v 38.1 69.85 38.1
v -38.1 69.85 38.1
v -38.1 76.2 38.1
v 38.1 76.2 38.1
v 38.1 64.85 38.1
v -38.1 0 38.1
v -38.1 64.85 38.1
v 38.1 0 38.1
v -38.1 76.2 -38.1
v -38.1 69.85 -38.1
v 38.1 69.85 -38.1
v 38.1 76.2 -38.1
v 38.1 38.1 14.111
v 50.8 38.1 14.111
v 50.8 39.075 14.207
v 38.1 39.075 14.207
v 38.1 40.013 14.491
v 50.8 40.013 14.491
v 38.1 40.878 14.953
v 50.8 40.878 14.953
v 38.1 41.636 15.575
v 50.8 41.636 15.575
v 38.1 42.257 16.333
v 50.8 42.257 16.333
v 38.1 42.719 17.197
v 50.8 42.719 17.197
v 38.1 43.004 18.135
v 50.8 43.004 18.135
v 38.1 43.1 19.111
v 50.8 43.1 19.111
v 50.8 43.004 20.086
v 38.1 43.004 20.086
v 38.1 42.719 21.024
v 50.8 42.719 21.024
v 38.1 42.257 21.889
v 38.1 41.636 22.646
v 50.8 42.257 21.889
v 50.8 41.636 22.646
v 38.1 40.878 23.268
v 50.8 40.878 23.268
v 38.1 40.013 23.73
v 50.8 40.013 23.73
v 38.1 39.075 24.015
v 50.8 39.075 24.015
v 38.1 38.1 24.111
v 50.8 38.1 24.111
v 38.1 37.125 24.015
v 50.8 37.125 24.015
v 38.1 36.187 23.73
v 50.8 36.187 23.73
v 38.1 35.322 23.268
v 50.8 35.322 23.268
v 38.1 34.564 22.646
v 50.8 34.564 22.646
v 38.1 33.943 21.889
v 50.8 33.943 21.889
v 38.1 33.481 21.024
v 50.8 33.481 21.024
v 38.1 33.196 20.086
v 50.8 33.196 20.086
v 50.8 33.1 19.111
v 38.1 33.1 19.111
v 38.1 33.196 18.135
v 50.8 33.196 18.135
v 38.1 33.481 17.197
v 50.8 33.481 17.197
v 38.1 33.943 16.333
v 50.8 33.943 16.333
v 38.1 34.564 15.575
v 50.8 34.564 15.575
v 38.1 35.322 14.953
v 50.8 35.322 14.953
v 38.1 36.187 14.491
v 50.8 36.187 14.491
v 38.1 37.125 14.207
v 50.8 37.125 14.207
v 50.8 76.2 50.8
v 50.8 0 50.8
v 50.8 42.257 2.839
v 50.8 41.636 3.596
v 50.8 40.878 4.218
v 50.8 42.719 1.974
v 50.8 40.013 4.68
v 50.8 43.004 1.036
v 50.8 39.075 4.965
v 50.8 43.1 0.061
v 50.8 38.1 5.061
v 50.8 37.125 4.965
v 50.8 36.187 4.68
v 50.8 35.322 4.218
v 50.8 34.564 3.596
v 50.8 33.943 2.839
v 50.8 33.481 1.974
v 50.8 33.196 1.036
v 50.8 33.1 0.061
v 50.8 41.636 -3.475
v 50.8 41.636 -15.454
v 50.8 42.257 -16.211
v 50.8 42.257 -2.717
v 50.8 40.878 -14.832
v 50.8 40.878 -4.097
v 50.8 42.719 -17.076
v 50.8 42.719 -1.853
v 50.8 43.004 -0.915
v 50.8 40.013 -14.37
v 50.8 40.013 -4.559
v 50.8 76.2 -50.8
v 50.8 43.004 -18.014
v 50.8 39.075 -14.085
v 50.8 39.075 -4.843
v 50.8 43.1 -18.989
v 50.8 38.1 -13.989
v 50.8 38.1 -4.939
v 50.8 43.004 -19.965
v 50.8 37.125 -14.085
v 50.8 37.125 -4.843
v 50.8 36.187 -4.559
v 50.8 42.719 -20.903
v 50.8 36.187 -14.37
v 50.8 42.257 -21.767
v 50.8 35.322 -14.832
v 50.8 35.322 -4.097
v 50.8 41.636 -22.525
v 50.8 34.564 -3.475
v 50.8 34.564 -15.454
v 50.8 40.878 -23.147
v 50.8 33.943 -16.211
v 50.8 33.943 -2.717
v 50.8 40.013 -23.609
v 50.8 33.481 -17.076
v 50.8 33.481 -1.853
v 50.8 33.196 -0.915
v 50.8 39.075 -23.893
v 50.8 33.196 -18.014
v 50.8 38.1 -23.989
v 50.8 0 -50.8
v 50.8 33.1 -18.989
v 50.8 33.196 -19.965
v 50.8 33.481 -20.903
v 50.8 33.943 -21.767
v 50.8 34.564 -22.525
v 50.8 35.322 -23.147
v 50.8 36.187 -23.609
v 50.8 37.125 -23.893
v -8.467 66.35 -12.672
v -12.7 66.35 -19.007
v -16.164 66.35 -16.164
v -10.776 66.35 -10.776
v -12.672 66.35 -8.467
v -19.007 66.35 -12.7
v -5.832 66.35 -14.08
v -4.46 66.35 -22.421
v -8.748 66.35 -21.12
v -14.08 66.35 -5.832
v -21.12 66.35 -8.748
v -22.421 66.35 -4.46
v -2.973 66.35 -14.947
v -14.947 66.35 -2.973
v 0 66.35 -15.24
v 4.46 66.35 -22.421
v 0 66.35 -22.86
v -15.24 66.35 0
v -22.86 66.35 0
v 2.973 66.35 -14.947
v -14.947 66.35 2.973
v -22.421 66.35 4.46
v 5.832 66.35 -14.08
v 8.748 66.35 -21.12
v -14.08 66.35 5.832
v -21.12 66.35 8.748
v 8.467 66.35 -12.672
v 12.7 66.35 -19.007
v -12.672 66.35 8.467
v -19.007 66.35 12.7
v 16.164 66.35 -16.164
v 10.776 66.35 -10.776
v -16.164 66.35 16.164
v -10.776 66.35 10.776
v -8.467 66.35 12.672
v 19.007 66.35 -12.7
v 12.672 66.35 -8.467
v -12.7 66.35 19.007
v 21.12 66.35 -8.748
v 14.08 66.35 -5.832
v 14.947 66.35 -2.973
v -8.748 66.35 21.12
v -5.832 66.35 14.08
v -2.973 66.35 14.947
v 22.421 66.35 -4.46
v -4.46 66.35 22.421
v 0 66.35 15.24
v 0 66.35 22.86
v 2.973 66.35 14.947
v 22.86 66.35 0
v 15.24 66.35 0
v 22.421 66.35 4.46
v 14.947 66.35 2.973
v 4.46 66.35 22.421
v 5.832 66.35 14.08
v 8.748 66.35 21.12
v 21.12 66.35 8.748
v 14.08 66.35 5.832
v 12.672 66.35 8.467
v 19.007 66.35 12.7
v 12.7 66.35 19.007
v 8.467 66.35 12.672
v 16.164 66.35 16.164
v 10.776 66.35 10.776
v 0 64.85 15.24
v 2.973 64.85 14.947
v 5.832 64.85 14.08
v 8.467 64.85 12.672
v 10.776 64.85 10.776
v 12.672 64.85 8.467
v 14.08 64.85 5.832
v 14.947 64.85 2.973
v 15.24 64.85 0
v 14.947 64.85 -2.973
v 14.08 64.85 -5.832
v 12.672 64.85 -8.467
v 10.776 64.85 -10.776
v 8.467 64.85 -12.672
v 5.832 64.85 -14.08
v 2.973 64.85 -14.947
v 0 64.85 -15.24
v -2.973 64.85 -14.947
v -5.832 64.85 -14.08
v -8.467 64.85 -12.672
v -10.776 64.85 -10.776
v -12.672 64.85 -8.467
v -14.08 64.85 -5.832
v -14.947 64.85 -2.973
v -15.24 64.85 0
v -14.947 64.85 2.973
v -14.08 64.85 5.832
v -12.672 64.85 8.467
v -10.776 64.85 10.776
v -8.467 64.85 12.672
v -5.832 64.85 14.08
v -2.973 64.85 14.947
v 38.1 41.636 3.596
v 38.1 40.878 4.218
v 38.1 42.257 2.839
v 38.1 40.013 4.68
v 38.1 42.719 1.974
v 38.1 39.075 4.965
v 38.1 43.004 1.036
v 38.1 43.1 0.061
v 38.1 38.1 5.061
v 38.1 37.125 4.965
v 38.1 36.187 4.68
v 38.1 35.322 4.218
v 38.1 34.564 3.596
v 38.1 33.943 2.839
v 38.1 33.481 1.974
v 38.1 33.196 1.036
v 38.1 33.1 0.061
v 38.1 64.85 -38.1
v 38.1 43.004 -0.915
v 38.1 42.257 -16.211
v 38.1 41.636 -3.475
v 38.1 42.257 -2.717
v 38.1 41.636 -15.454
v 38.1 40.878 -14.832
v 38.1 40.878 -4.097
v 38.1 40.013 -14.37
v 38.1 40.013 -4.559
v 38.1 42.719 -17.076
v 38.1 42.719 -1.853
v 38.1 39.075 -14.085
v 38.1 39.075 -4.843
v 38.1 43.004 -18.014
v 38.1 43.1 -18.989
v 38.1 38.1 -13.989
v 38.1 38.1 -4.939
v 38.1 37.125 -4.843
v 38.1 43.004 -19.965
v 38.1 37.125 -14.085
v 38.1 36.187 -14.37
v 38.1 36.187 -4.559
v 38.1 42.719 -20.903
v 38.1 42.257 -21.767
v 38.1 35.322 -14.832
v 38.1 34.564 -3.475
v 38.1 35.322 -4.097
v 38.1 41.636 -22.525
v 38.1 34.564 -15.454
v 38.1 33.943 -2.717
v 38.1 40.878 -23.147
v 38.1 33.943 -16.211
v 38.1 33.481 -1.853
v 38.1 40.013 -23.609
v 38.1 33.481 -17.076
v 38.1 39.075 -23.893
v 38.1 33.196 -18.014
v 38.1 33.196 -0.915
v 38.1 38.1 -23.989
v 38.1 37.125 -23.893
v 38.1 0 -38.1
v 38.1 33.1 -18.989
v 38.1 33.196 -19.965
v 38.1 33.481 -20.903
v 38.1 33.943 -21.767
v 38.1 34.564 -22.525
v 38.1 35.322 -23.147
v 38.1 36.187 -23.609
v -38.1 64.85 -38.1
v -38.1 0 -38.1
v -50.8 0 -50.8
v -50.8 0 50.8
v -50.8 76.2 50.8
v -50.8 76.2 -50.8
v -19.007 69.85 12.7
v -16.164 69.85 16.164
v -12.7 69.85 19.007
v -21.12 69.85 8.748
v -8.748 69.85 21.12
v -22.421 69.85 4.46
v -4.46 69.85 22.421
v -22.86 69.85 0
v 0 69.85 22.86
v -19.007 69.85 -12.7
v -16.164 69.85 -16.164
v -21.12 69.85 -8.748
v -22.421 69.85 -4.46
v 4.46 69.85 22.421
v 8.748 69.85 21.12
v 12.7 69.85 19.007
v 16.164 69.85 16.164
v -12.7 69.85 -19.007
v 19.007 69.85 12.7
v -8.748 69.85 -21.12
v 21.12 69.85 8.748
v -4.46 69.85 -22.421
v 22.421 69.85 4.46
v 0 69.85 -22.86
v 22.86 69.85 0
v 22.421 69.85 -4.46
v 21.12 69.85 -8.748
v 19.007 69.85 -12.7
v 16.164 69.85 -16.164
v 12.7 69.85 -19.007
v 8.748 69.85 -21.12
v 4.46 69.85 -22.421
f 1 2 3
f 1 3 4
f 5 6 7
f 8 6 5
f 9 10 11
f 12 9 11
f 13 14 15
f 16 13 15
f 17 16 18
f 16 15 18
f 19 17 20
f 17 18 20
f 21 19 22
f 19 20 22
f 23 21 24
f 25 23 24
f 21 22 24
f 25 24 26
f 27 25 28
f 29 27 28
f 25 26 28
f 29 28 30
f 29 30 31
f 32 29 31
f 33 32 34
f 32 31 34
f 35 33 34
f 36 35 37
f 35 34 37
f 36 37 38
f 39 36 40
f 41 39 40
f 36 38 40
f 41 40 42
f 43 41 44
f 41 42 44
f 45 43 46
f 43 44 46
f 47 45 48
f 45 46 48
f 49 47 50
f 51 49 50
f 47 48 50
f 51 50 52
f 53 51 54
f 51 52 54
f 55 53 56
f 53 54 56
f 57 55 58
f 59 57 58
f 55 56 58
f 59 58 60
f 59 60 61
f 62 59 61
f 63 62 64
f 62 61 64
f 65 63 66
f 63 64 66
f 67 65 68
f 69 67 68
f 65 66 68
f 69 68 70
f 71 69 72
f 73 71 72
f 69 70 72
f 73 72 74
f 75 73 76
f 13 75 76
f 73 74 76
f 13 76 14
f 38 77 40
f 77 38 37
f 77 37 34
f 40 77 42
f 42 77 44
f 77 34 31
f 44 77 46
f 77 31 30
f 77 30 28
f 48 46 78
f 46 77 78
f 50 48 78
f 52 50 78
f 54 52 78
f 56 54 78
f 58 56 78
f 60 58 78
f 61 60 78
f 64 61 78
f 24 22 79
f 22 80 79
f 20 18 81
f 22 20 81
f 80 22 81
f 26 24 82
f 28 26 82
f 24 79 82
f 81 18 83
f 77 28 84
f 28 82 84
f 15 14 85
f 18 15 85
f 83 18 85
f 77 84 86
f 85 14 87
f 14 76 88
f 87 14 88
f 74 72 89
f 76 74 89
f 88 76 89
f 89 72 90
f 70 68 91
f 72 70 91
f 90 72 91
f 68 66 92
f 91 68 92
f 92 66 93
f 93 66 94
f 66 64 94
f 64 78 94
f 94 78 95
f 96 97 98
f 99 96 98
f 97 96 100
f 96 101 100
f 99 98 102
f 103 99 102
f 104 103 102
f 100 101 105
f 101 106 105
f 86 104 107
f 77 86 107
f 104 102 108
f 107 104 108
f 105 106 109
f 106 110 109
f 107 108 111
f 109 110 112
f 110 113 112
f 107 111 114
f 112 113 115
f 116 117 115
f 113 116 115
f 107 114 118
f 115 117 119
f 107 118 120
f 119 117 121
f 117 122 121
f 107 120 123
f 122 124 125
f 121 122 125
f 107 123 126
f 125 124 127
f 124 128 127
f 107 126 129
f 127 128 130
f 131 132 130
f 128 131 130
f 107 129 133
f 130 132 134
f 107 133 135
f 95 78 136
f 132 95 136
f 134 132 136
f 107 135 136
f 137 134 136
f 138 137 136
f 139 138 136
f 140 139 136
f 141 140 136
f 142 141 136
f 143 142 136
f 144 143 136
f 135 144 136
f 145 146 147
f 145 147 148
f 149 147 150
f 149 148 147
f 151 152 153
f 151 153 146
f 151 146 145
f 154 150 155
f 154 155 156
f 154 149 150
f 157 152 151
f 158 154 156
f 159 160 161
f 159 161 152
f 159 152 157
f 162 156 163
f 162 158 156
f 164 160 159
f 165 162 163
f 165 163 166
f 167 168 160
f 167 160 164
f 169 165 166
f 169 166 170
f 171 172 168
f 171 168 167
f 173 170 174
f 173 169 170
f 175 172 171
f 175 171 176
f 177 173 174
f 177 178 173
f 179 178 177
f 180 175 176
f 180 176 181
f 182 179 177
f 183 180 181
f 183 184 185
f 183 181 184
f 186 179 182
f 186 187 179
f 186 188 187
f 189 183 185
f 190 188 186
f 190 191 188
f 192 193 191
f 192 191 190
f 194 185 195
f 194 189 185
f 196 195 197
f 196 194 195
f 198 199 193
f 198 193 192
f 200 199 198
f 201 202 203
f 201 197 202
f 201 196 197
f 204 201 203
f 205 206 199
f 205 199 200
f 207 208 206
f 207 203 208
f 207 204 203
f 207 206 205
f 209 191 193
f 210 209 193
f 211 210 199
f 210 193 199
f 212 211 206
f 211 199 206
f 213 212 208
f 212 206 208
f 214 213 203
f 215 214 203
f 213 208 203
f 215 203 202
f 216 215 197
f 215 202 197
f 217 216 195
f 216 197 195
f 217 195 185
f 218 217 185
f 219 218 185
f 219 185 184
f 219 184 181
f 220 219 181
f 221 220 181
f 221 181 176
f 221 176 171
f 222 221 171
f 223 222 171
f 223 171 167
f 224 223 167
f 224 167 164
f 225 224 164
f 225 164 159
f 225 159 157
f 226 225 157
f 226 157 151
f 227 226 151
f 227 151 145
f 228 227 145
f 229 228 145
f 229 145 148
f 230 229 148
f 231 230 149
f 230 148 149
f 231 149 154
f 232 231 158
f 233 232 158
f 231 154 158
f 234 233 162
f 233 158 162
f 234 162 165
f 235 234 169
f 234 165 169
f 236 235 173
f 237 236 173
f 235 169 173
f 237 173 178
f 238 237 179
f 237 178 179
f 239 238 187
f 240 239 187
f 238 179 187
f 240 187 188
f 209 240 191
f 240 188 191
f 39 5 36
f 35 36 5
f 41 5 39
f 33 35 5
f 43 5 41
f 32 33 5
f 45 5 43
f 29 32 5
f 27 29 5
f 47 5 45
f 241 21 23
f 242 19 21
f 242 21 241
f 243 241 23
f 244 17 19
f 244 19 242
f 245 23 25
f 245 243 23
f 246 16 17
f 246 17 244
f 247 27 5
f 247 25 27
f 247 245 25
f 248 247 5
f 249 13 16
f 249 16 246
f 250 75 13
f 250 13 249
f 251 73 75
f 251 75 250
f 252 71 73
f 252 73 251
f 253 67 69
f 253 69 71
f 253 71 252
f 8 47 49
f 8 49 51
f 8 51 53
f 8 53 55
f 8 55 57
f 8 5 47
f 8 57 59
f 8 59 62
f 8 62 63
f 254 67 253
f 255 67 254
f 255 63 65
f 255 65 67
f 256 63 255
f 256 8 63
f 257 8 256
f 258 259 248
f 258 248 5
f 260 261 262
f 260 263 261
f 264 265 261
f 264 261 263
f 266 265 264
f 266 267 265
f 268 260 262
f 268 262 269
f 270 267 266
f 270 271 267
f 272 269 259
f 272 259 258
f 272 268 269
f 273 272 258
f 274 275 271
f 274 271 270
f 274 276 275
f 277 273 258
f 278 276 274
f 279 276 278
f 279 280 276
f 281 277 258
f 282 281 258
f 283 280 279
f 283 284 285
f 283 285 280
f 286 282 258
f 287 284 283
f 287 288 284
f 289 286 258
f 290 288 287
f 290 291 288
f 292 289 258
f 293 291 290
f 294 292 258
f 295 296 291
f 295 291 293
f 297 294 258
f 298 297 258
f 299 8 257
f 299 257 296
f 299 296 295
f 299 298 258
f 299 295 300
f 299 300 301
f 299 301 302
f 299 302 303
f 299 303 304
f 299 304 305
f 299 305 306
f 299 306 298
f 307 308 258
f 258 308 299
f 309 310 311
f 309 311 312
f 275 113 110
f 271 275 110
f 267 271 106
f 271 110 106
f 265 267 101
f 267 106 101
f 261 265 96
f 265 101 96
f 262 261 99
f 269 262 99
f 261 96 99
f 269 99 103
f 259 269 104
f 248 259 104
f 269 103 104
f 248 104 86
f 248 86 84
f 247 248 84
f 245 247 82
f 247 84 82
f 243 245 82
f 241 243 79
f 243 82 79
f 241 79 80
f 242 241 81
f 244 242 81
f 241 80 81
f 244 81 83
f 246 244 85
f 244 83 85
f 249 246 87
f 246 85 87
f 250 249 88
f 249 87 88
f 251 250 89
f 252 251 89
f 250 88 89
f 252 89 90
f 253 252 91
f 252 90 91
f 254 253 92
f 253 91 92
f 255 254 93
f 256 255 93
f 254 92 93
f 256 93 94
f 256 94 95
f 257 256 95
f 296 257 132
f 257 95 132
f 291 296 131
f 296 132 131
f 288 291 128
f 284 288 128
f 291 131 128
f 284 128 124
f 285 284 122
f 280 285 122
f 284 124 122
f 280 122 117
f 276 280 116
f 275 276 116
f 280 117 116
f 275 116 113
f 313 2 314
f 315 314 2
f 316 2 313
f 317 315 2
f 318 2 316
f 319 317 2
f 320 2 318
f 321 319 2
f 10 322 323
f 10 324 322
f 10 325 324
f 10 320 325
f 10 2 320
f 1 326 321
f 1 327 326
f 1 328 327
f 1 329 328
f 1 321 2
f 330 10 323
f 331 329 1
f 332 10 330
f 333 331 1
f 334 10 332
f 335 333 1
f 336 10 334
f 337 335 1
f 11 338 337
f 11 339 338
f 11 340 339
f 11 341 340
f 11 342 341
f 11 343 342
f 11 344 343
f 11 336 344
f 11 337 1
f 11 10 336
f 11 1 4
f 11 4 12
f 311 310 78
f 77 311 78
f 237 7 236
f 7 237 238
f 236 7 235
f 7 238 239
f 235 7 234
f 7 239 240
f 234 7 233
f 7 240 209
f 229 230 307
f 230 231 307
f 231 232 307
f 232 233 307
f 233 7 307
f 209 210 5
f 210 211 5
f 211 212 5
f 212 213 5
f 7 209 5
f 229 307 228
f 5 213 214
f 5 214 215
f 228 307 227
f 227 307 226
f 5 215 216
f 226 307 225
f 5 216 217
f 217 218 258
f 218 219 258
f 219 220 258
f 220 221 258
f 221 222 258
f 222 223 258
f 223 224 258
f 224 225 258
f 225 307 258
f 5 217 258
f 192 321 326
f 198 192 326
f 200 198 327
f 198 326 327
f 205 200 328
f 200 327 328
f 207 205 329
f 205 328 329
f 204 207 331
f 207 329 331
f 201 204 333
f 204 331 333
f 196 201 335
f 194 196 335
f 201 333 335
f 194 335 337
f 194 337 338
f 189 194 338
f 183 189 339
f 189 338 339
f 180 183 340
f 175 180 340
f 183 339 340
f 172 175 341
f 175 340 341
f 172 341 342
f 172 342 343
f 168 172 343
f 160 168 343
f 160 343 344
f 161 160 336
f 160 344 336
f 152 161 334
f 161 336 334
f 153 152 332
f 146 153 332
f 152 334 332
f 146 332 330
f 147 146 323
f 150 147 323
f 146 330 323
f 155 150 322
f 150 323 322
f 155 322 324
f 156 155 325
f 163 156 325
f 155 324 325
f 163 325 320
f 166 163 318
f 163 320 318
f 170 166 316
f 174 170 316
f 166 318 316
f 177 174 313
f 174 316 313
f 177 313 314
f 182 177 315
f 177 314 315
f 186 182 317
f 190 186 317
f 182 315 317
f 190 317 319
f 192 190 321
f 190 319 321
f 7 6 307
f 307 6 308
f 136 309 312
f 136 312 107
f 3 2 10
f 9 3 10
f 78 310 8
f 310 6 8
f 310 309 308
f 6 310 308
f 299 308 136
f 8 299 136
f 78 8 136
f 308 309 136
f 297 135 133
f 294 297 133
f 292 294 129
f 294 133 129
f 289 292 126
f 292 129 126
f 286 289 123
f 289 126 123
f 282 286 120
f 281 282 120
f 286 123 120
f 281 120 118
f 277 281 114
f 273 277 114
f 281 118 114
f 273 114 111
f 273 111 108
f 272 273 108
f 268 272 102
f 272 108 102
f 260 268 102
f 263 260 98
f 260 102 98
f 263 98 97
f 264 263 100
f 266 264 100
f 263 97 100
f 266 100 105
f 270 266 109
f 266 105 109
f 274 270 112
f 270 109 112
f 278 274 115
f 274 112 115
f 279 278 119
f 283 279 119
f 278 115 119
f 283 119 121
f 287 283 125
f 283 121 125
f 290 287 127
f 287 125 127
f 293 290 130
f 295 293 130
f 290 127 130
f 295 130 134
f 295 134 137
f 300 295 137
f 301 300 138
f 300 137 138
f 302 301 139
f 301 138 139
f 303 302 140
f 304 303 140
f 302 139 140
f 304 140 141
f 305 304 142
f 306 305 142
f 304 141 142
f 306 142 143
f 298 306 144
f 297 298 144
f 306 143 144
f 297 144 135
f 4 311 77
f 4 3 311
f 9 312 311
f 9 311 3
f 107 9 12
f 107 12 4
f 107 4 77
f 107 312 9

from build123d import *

# Parameters (mm, degrees)
SKETCH1_W           = 101.6
SKETCH1_H           = 101.6
SKETCH1_W_2         = 76.2
SKETCH1_H_2         = 76.2
BOSS_EXTRUDE1_DEPTH = 76.2
BOSS_EXTRUDE2_START = -6.35
SKETCH2_W           = 76.2
SKETCH2_H           = 76.2
SKETCH2_R           = 15.24
BOSS_EXTRUDE2_DEPTH = 5
SKETCH3_R           = 22.86
CUT_EXTRUDE2_DEPTH  = 3.5
SKETCH4_R           = 5
CUT_EXTRUDE3_DEPTH  = 12.7


with BuildPart() as part:
    # Sketch1 → Boss-Extrude1 (new body)
    with BuildSketch(Plane(origin=(0, 0, 0), x_dir=(1, 0, 0), z_dir=(0, 1, 0))):
        Rectangle(SKETCH1_W, SKETCH1_H)
        Rectangle(SKETCH1_W_2, SKETCH1_H_2, mode=Mode.SUBTRACT)
    extrude(amount=BOSS_EXTRUDE1_DEPTH)

    # Sketch2 → Boss-Extrude2 (add)
    with BuildSketch(Plane(origin=(0, 76.2, 0), x_dir=(1, 0, 0), z_dir=(0, 1, 0)).offset(BOSS_EXTRUDE2_START)):
        Rectangle(SKETCH2_W, SKETCH2_H)
        with Locations(Location((0, 0, 0), (0, 0, 270))):
            Circle(SKETCH2_R, mode=Mode.SUBTRACT)
    extrude(amount=-BOSS_EXTRUDE2_DEPTH)

    # Sketch3 → Cut-Extrude2 (cut)
    with BuildSketch(Plane(origin=(0, 69.85, 0), x_dir=(1, 0, 0), z_dir=(0, 1, 0))):
        with Locations(Location((0, 0, 0), (0, 0, 270))):
            Circle(SKETCH3_R)
    extrude(amount=-CUT_EXTRUDE2_DEPTH, mode=Mode.SUBTRACT)

    # Sketch4 → Cut-Extrude3 (cut)
    with BuildSketch(Plane(origin=(50.8, 0, 0), x_dir=(0, 0, -1), z_dir=(1, 0, 0))):
        with Locations((-19.110683009, 38.1)):
            Circle(SKETCH4_R)
        with Locations((-0.060683009, 38.1)):
            Circle(SKETCH4_R)
        with Locations((18.989316991, 38.1)):
            Circle(SKETCH4_R)
    extrude(amount=-CUT_EXTRUDE3_DEPTH, mode=Mode.SUBTRACT)


solid = part.part
